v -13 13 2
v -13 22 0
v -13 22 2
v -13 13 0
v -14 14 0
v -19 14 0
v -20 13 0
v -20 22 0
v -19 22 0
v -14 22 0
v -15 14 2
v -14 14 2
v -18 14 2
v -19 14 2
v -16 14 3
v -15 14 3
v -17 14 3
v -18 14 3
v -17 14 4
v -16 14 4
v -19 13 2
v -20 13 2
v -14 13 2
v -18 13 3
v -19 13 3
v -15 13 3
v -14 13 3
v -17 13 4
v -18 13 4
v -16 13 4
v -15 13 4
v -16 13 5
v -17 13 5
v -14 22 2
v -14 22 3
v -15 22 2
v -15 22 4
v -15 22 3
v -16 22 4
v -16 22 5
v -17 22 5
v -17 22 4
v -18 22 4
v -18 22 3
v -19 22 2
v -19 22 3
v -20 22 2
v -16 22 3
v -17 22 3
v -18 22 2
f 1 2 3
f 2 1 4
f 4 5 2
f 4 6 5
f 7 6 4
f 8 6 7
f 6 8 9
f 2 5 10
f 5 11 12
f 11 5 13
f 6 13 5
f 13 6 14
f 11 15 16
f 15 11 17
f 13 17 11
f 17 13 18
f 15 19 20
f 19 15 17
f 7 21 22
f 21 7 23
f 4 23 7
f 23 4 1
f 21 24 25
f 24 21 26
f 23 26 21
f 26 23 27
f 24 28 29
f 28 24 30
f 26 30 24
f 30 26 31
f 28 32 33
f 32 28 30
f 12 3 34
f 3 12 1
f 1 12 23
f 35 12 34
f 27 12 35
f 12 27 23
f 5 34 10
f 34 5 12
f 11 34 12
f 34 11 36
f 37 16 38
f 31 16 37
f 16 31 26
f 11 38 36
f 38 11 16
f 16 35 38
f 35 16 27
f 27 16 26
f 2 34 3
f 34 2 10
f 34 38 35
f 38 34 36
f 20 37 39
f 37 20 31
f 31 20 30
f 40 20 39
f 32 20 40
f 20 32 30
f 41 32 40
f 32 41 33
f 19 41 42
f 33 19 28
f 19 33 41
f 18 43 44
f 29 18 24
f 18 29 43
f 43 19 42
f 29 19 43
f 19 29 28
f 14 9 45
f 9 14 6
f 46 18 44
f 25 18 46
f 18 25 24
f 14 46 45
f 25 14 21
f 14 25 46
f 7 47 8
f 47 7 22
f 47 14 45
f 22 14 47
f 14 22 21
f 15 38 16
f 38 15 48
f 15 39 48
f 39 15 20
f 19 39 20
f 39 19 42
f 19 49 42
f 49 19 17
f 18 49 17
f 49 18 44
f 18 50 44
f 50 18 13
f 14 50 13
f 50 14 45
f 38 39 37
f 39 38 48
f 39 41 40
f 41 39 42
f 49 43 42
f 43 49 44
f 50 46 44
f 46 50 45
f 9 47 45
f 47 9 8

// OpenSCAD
fastRender = true;

$fn = 8;
module minecraftCube(x,y,z,colorIn)
{
    if(fastRender == true)
    {
        color(colorIn) translate([x,y,z]) cube(1);
    }
    else
    {
        color(colorIn) translate([x,y,z])
        minkowski()
        {
            cube(0.65);
            sphere(d = 0.65);
        }
    }
}
// chunkX = 12, chunkZ = 5, offsetX = 0, offsetZ = 0
minecraftCube(-14,13,0,[0.3200,0.3200,0.3200]);// granite
minecraftCube(-14,13,1,[0.3200,0.3200,0.3200]);// granite
minecraftCube(-15,13,0,[0.3200,0.3200,0.3200]);// granite
minecraftCube(-15,13,1,[0.3200,0.3200,0.3200]);// granite
minecraftCube(-15,13,2,[0.3200,0.3200,0.3200]);// granite
minecraftCube(-14,14,0,[0.3200,0.3200,0.3200]);// granite
minecraftCube(-14,14,1,[0.3200,0.3200,0.3200]);// granite
minecraftCube(-15,14,2,[0.3200,0.3200,0.3200]);// granite
minecraftCube(-14,15,0,[0.3200,0.3200,0.3200]);// granite
minecraftCube(-14,15,1,[0.3200,0.3200,0.3200]);// granite
minecraftCube(-15,15,2,[0.3200,0.3200,0.3200]);// granite
// chunkX = 12, chunkZ = 6, offsetX = 0, offsetZ = 16
minecraftCube(-14,16,0,[0.3200,0.3200,0.3200]);// granite
minecraftCube(-14,16,1,[0.3200,0.3200,0.3200]);// granite
minecraftCube(-15,16,2,[0.3200,0.3200,0.3200]);// granite
minecraftCube(-14,17,0,[0.3200,0.3200,0.3200]);// granite
minecraftCube(-14,17,1,[0.3200,0.3200,0.3200]);// granite
minecraftCube(-15,17,2,[0.3200,0.3200,0.3200]);// granite
minecraftCube(-14,18,0,[0.3200,0.3200,0.3200]);// granite
minecraftCube(-14,18,1,[0.3200,0.3200,0.3200]);// granite
minecraftCube(-15,18,2,[0.3200,0.3200,0.3200]);// granite
minecraftCube(-14,19,0,[0.3200,0.3200,0.3200]);// granite
minecraftCube(-14,19,1,[0.3200,0.3200,0.3200]);// granite
minecraftCube(-15,19,2,[0.3200,0.3200,0.3200]);// granite
minecraftCube(-14,20,0,[0.3200,0.3200,0.3200]);// granite
minecraftCube(-14,20,1,[0.3200,0.3200,0.3200]);// granite
minecraftCube(-15,20,2,[0.3200,0.3200,0.3200]);// granite
minecraftCube(-14,21,0,[0.3200,0.3200,0.3200]);// granite
minecraftCube(-14,21,1,[0.3200,0.3200,0.3200]);// granite
minecraftCube(-15,21,2,[0.3200,0.3200,0.3200]);// granite
// chunkX = 13, chunkZ = 5, offsetX = -16, offsetZ = 0
minecraftCube(-16,13,0,[0.3200,0.3200,0.3200]);// granite
minecraftCube(-16,13,1,[0.3200,0.3200,0.3200]);// granite
minecraftCube(-16,13,2,[0.3200,0.3200,0.3200]);// granite
minecraftCube(-16,13,3,[0.3200,0.3200,0.3200]);// granite
minecraftCube(-17,13,0,[0.3200,0.3200,0.3200]);// granite
minecraftCube(-17,13,1,[0.3200,0.3200,0.3200]);// granite
minecraftCube(-17,13,2,[0.3200,0.3200,0.3200]);// granite
minecraftCube(-17,13,3,[0.3200,0.3200,0.3200]);// granite
minecraftCube(-17,13,4,[0.3200,0.3200,0.3200]);// granite
minecraftCube(-18,13,0,[0.3200,0.3200,0.3200]);// granite
minecraftCube(-18,13,1,[0.3200,0.3200,0.3200]);// granite
minecraftCube(-18,13,2,[0.3200,0.3200,0.3200]);// granite
minecraftCube(-18,13,3,[0.3200,0.3200,0.3200]);// granite
minecraftCube(-19,13,0,[0.3200,0.3200,0.3200]);// granite
minecraftCube(-19,13,1,[0.3200,0.3200,0.3200]);// granite
minecraftCube(-19,13,2,[0.3200,0.3200,0.3200]);// granite
minecraftCube(-20,13,0,[0.3200,0.3200,0.3200]);// granite
minecraftCube(-20,13,1,[0.3200,0.3200,0.3200]);// granite
minecraftCube(-16,14,3,[0.3200,0.3200,0.3200]);// granite
minecraftCube(-17,14,4,[0.3200,0.3200,0.3200]);// granite
minecraftCube(-18,14,3,[0.3200,0.3200,0.3200]);// granite
minecraftCube(-19,14,2,[0.3200,0.3200,0.3200]);// granite
minecraftCube(-20,14,0,[0.3200,0.3200,0.3200]);// granite
minecraftCube(-20,14,1,[0.3200,0.3200,0.3200]);// granite
minecraftCube(-16,15,3,[0.3200,0.3200,0.3200]);// granite
minecraftCube(-17,15,4,[0.3200,0.3200,0.3200]);// granite
minecraftCube(-18,15,3,[0.3200,0.3200,0.3200]);// granite
minecraftCube(-19,15,2,[0.3200,0.3200,0.3200]);// granite
minecraftCube(-20,15,0,[0.3200,0.3200,0.3200]);// granite
minecraftCube(-20,15,1,[0.3200,0.3200,0.3200]);// granite
// chunkX = 13, chunkZ = 6, offsetX = -16, offsetZ = 16
minecraftCube(-16,16,3,[0.3200,0.3200,0.3200]);// granite
minecraftCube(-17,16,4,[0.3200,0.3200,0.3200]);// granite
minecraftCube(-18,16,3,[0.3200,0.3200,0.3200]);// granite
minecraftCube(-19,16,2,[0.3200,0.3200,0.3200]);// granite
minecraftCube(-20,16,0,[0.3200,0.3200,0.3200]);// granite
minecraftCube(-20,16,1,[0.3200,0.3200,0.3200]);// granite
minecraftCube(-16,17,3,[0.3200,0.3200,0.3200]);// granite
minecraftCube(-17,17,4,[0.3200,0.3200,0.3200]);// granite
minecraftCube(-18,17,3,[0.3200,0.3200,0.3200]);// granite
minecraftCube(-19,17,2,[0.3200,0.3200,0.3200]);// granite
minecraftCube(-20,17,0,[0.3200,0.3200,0.3200]);// granite
minecraftCube(-20,17,1,[0.3200,0.3200,0.3200]);// granite
minecraftCube(-16,18,3,[0.3200,0.3200,0.3200]);// granite
minecraftCube(-17,18,4,[0.3200,0.3200,0.3200]);// granite
minecraftCube(-18,18,3,[0.3200,0.3200,0.3200]);// granite
minecraftCube(-19,18,2,[0.3200,0.3200,0.3200]);// granite
minecraftCube(-20,18,0,[0.3200,0.3200,0.3200]);// granite
minecraftCube(-20,18,1,[0.3200,0.3200,0.3200]);// granite
minecraftCube(-16,19,3,[0.3200,0.3200,0.3200]);// granite
minecraftCube(-17,19,4,[0.3200,0.3200,0.3200]);// granite
minecraftCube(-18,19,3,[0.3200,0.3200,0.3200]);// granite
minecraftCube(-19,19,2,[0.3200,0.3200,0.3200]);// granite
minecraftCube(-20,19,0,[0.3200,0.3200,0.3200]);// granite
minecraftCube(-20,19,1,[0.3200,0.3200,0.3200]);// granite
minecraftCube(-16,20,3,[0.3200,0.3200,0.3200]);// granite
minecraftCube(-17,20,4,[0.3200,0.3200,0.3200]);// granite
minecraftCube(-18,20,3,[0.3200,0.3200,0.3200]);// granite
minecraftCube(-19,20,2,[0.3200,0.3200,0.3200]);// granite
minecraftCube(-20,20,0,[0.3200,0.3200,0.3200]);// granite
minecraftCube(-20,20,1,[0.3200,0.3200,0.3200]);// granite
minecraftCube(-16,21,3,[0.3200,0.3200,0.3200]);// granite
minecraftCube(-17,21,4,[0.3200,0.3200,0.3200]);// granite
minecraftCube(-18,21,3,[0.3200,0.3200,0.3200]);// granite
minecraftCube(-19,21,2,[0.3200,0.3200,0.3200]);// granite
minecraftCube(-20,21,0,[0.3200,0.3200,0.3200]);// granite
minecraftCube(-20,21,1,[0.3200,0.3200,0.3200]);// granite
